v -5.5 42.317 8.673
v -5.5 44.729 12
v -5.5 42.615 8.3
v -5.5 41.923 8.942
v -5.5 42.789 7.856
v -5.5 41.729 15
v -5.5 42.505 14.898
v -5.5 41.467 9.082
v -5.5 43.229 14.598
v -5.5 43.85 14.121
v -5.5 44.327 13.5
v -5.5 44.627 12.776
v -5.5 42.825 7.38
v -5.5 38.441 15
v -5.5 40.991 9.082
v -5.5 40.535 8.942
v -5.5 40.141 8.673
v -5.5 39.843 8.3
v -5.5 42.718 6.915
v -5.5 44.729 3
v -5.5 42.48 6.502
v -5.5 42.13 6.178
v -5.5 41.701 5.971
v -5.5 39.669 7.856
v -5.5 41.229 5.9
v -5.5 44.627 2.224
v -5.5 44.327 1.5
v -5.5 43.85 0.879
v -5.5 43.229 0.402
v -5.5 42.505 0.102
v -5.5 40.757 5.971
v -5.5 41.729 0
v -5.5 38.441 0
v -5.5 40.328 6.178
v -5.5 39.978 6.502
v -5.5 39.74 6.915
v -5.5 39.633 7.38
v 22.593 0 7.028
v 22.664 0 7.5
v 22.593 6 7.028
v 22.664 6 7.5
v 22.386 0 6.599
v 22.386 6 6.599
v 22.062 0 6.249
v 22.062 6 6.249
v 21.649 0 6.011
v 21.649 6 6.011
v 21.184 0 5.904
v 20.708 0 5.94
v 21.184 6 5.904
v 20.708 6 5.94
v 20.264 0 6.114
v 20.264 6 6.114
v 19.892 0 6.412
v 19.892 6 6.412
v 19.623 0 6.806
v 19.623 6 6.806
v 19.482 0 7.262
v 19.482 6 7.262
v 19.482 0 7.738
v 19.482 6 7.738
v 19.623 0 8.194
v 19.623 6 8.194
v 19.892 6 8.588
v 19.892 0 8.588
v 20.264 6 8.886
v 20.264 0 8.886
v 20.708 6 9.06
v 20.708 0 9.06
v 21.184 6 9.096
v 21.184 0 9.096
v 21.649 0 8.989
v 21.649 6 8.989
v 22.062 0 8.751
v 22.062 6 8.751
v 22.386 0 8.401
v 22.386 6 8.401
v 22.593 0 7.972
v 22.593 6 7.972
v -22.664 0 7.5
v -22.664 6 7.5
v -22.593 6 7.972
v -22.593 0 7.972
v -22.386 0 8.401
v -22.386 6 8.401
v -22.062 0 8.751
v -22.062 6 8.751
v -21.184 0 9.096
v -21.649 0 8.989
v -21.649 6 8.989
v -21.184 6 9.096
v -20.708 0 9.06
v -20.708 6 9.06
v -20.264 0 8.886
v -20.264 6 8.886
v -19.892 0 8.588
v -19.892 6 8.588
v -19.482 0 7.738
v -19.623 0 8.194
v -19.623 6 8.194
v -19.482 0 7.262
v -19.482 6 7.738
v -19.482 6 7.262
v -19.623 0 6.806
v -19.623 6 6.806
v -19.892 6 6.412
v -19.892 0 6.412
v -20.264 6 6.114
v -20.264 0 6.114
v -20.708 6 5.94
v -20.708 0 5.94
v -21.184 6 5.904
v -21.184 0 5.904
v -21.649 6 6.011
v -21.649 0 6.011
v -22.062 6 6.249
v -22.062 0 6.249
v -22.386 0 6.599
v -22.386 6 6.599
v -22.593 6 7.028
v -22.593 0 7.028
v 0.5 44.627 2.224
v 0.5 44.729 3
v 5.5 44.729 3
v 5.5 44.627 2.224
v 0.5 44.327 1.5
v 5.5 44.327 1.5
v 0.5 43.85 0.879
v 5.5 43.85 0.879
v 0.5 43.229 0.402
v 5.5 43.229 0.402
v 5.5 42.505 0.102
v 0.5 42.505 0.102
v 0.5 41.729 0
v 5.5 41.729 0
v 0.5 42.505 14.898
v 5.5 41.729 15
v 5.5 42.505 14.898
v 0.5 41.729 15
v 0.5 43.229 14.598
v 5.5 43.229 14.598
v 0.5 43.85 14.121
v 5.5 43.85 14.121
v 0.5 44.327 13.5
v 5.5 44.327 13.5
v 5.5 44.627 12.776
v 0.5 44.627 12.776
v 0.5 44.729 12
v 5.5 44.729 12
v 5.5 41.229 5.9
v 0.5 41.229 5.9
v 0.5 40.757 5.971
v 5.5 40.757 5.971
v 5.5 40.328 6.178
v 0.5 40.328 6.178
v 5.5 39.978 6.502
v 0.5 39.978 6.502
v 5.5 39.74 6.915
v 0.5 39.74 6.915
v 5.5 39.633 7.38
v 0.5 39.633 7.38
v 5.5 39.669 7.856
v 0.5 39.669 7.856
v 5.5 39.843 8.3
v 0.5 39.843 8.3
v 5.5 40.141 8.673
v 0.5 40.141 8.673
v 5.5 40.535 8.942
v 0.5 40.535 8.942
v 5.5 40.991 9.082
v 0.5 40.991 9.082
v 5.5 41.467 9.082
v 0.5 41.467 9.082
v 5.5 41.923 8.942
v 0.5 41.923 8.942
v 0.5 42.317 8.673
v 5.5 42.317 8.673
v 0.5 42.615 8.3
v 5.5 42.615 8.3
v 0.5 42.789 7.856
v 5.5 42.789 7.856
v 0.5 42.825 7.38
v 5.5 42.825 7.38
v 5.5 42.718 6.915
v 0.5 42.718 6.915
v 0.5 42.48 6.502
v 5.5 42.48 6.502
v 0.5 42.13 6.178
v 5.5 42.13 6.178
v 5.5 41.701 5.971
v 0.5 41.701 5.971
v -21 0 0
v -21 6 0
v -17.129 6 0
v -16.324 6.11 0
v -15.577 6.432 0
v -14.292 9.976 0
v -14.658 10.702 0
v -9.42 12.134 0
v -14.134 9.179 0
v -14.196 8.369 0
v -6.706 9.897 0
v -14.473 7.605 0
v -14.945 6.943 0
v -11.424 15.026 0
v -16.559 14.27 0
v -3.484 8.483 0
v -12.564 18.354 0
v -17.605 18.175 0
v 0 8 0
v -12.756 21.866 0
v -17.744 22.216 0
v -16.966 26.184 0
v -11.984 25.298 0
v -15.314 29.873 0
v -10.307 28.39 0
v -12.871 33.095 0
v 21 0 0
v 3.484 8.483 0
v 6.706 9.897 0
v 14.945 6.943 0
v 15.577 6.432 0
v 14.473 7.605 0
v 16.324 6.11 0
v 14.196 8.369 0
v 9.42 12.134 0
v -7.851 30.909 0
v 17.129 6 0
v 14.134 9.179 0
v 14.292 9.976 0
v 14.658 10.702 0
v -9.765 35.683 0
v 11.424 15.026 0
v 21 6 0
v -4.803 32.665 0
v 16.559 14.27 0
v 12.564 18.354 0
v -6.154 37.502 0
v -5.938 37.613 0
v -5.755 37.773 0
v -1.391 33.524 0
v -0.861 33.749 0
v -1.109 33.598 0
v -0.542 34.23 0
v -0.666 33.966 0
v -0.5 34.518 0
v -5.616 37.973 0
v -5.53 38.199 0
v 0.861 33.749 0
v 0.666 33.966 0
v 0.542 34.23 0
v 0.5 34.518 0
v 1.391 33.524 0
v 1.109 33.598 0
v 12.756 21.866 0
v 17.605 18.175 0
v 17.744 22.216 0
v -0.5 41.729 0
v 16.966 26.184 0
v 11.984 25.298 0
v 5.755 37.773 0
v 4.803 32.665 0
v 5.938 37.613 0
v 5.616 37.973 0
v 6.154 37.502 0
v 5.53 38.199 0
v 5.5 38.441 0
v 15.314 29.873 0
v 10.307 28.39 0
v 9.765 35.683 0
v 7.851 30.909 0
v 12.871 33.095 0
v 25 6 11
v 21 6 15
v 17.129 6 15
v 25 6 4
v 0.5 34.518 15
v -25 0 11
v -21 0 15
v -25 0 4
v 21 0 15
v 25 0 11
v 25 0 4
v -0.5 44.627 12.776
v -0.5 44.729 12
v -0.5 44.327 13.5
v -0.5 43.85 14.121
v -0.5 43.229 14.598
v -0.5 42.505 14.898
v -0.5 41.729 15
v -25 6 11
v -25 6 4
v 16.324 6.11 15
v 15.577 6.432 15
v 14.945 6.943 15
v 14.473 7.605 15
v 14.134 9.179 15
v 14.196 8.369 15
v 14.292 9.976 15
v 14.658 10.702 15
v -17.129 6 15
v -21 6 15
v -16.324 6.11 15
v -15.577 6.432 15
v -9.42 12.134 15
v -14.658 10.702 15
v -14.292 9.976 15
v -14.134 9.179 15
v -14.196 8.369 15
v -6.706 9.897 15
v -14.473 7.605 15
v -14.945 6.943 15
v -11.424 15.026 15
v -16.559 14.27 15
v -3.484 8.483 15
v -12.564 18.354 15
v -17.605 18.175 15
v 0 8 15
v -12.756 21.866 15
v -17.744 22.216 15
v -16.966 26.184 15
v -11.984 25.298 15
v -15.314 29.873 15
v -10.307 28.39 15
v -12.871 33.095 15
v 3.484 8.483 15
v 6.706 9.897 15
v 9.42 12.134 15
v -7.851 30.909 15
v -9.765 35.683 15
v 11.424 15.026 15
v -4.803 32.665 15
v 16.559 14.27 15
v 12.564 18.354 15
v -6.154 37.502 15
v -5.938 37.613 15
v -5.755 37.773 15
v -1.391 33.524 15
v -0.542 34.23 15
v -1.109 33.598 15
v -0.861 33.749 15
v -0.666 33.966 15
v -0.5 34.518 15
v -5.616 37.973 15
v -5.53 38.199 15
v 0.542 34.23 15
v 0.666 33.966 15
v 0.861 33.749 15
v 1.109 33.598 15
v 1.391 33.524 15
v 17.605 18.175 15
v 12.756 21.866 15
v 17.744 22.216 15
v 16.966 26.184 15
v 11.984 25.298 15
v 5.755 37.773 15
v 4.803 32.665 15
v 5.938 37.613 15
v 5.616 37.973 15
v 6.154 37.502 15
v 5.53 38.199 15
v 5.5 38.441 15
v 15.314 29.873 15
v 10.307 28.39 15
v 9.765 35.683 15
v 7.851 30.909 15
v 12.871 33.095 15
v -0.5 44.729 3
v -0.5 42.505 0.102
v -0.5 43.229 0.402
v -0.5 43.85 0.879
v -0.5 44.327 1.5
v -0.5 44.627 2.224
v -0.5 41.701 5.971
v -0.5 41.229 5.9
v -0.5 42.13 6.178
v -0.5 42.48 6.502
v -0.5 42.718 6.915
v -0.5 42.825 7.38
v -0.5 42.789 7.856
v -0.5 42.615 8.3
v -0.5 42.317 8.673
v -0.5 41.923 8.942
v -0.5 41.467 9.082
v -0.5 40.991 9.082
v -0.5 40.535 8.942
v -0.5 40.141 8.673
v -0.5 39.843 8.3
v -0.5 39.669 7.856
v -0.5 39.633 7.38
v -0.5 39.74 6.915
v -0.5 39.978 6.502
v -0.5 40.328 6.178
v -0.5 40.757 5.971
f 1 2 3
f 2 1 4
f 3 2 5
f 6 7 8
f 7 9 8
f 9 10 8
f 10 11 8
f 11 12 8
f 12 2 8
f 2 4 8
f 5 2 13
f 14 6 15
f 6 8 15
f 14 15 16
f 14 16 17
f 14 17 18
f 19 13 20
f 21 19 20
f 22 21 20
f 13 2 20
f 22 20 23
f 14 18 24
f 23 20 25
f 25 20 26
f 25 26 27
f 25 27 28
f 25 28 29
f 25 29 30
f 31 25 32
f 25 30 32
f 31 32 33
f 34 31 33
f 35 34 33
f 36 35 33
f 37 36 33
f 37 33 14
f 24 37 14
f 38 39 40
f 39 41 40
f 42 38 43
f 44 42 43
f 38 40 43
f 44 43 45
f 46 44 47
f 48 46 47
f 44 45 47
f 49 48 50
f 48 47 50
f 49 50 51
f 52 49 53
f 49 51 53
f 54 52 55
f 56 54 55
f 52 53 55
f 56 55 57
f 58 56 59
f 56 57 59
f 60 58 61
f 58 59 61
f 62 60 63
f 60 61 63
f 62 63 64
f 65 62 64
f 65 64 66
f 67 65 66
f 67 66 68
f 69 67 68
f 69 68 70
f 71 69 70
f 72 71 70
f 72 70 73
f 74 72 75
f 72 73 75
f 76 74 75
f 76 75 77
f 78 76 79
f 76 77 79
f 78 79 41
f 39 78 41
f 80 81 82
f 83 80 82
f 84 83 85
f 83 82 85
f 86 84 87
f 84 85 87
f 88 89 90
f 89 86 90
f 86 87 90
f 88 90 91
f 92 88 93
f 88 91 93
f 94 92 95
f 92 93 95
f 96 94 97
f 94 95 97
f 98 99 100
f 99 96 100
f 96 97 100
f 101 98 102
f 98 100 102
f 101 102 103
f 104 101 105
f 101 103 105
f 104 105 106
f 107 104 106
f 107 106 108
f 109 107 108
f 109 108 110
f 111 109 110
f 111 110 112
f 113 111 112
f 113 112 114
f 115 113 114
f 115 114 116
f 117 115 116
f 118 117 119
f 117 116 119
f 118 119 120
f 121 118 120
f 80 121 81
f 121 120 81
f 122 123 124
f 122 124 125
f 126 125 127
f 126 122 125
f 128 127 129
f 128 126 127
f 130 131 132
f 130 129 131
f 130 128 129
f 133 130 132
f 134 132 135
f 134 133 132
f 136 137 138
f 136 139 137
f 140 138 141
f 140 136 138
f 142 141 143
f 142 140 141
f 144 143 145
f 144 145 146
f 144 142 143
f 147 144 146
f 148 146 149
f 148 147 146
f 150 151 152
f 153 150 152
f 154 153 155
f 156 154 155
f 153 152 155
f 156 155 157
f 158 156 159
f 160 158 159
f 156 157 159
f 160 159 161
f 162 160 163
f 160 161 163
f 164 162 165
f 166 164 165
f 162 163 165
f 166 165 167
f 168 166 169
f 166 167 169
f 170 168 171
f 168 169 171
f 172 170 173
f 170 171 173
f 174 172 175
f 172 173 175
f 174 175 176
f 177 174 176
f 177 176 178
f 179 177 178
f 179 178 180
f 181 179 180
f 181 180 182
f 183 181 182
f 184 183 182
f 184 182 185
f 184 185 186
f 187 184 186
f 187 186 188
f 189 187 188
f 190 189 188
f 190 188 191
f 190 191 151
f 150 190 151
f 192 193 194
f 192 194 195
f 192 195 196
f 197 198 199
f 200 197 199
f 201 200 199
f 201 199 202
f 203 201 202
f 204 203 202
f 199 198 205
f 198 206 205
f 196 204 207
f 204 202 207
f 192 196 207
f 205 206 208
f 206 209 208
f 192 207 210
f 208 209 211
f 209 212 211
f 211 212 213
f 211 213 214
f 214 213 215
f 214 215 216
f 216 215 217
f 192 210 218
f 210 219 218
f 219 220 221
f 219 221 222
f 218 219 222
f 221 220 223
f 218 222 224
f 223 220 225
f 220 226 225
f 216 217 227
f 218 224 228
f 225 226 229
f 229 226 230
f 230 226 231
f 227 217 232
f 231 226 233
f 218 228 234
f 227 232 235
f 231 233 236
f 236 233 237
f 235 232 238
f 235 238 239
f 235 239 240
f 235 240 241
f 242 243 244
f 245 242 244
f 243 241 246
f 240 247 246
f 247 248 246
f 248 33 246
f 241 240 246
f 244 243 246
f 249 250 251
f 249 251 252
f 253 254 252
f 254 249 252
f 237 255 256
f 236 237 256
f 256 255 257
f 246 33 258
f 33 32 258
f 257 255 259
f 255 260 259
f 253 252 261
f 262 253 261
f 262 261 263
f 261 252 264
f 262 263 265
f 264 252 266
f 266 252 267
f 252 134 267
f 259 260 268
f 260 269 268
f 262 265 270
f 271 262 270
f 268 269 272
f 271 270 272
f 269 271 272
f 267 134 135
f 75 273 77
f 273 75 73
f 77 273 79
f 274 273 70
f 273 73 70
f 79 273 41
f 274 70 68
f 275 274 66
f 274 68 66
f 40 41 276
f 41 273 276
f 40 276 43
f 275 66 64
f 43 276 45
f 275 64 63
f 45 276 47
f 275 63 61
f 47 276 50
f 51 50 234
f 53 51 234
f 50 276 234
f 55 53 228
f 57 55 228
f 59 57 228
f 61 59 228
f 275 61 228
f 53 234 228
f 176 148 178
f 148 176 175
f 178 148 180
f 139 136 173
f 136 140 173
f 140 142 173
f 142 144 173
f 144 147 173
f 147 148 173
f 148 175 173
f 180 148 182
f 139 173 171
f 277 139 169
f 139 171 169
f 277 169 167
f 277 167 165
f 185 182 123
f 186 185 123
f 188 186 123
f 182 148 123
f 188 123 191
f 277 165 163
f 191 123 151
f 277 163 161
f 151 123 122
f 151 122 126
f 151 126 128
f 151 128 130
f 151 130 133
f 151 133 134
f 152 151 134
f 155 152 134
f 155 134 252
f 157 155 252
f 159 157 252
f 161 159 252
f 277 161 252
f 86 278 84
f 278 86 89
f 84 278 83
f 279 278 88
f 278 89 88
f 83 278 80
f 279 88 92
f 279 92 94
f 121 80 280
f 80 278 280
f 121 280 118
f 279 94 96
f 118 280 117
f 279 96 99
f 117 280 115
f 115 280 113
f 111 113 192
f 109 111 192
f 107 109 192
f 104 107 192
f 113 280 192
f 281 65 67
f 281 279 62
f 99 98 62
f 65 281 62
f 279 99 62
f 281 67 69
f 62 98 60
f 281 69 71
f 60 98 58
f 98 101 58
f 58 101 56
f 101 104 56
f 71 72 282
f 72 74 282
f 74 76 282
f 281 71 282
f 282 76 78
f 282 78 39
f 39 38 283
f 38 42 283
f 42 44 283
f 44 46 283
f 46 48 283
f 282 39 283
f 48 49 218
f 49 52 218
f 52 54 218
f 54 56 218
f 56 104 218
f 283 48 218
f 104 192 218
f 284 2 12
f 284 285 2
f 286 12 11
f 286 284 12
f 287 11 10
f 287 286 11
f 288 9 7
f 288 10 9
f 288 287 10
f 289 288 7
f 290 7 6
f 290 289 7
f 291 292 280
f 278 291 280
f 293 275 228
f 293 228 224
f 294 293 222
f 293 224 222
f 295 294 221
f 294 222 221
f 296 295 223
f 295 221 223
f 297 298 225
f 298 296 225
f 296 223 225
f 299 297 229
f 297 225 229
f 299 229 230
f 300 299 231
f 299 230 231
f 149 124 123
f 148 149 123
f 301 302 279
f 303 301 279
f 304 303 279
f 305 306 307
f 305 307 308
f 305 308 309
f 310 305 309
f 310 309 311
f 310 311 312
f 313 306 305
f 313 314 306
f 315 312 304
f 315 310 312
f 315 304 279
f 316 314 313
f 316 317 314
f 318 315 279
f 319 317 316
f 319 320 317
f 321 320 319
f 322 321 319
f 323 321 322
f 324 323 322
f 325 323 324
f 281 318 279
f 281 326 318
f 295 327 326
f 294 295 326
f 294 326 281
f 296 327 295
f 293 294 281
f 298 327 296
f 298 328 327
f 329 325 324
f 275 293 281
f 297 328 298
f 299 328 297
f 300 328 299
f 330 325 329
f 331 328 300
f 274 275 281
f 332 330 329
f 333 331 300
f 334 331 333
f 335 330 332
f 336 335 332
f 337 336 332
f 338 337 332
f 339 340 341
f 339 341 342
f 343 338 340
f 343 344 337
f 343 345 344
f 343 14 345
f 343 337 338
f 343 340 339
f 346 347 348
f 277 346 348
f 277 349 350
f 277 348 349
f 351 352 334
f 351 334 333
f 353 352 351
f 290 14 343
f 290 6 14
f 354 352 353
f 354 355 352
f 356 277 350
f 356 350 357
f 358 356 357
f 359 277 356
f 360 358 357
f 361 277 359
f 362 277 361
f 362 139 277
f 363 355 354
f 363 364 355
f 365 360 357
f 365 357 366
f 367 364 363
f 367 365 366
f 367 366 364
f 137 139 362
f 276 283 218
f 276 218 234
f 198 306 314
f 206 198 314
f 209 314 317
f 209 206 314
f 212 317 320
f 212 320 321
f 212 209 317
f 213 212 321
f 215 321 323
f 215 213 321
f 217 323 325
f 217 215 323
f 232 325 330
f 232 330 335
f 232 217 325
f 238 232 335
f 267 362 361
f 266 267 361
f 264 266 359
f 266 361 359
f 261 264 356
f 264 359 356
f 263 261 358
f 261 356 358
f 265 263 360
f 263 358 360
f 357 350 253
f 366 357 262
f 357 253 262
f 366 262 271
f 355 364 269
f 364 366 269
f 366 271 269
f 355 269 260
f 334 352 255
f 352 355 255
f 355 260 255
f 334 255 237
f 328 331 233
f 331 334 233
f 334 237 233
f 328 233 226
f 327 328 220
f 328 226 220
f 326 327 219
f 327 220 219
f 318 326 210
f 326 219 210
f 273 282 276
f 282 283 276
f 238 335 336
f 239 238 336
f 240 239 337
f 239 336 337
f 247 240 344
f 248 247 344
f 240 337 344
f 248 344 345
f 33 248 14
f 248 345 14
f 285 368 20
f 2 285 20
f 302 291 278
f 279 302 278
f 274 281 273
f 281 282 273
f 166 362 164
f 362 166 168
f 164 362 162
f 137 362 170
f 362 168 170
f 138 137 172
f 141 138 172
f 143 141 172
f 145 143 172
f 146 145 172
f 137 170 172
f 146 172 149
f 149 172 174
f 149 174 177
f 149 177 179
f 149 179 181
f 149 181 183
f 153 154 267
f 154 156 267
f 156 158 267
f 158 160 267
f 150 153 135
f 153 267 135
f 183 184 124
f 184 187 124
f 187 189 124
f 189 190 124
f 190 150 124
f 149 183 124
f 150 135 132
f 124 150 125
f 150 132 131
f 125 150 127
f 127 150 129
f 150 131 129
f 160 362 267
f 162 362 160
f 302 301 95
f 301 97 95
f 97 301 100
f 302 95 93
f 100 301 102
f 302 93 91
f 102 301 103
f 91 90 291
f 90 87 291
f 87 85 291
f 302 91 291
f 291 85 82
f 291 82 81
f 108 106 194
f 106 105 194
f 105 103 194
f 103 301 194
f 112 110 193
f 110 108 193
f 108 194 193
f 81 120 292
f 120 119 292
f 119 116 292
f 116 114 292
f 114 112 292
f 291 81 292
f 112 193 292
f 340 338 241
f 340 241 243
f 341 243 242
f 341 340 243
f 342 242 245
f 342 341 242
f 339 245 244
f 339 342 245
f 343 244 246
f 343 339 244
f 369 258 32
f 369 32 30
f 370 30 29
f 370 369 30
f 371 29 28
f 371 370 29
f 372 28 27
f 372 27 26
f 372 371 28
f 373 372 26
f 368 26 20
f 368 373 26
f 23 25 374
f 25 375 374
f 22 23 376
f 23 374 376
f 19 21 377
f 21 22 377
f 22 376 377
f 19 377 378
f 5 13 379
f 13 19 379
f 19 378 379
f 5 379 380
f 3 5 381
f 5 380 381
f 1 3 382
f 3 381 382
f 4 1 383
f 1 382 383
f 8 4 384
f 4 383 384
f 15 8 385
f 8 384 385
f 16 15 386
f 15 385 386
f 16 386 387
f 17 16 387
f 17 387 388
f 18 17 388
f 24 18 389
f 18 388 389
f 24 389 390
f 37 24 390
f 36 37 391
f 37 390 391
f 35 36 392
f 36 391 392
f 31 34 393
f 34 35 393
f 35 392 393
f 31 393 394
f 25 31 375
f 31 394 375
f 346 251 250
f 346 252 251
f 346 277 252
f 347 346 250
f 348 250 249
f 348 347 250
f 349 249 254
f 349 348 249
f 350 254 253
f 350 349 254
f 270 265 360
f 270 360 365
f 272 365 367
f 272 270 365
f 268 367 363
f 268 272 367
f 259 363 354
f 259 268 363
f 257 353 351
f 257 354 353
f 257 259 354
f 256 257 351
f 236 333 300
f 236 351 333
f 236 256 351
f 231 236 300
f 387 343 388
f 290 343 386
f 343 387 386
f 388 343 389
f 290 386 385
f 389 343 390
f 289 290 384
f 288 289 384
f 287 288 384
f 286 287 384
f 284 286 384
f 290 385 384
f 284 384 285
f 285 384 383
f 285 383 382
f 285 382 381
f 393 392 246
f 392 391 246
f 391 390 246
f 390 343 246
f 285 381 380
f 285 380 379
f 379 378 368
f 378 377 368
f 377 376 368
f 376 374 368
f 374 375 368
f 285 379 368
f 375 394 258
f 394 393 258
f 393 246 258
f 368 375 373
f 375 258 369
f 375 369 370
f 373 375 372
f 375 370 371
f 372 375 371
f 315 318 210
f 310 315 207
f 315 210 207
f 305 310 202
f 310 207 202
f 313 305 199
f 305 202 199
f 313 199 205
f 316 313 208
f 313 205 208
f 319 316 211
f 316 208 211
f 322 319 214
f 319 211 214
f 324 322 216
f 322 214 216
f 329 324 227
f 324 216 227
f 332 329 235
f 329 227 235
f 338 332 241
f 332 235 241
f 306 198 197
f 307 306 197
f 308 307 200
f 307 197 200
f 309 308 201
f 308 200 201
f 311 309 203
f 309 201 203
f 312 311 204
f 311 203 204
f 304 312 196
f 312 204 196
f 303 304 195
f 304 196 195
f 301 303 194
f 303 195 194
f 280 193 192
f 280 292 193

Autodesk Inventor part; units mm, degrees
ref_plane "YZ Plane" through (0, 0, 0) normal (1, 0, 0) x (0, 1, 0)
ref_plane "XZ Plane" through (0, 0, 0) normal (0, 1, 0) x (-1, 0, 0)
ref_plane "XY Plane" through (0, 0, 0) normal (0, 0, 1) x (1, 0, 0)
sketch "Sketch1" plane through (0, 0, 0) normal (0, 0, 1) x (1, 0, 0)
  line L0 (0, 0) -> (25, 0)
  line L1 (25, 0) -> (25, 6)
  line L2 (25, 6) -> (17.1289, 6)
  arc A0 (14.6584, 10.7019) -> (5.5, 37.729) centre (0, 20.8) ccw
  line L3 (0, 0) -> (0, 8)
  arc A1 (0, 8) -> (0.5, 33.5902) centre (0, 20.8) ccw
  arc A2 (14.6584, 10.7019) -> (17.1289, 6) centre (17.1289, 9) ccw
  line L4 (5.5, 37.729) -> (5.5, 44.729)
  line L5 (5.5, 44.729) -> (0.5, 44.729)
  line L6 (0.5, 44.729) -> (0.5, 33.5902)
  point P0 (9.8894, 6)
  dimension "d0" = 12.8
  dimension "d2" = 5
  dimension "d3" = 25
  dimension "d4" = 6
  dimension "d5" = 8
  dimension "d6" = 3
  dimension "d7" = 1
  dimension "d8" = 5
  dimension "d9" = 7
extrude "Extrusion1" add sketch "Sketch1" along normal blind 15
sketch "Sketch2" plane through (17.1289, 6, 0) normal (0, 1, 0) x (1, 0, 0)
  line L0 (7.8711, 0) -> (7.8711, -15) projected
  line L1 (7.8711, -15) -> (0, 0) construction
  line L2 (7.8711, 0) -> (0, 0) projected
  circle A0 centre (3.9355, -7.5) radius 1.6
  point P0 (-17.1289, 0)
  dimension "d15" = 3.2
extrude "Extrusion2" cut sketch "Sketch2" against normal through all
chamfer "Chamfer1" distance 4 angle 45 2 edges at (25, 3, 15) (25, 3, 0)
sketch "Sketch3" plane through (5.5, 37.729, 0) normal (1, 0, 0) x (0, 0, -1)
  line L0 (-15, 0) -> (0, 7) construction
  point P0 (0, -37.729)
  point P1 (-7.5, 3.5)
hole "Hole1" at (5.5, 41.229, 7.5) direction (-1, 0, 0) diameter 3.2 end through all
fillet "Fillet1" radius 3 2 edges at (3, 44.729, 0) (3, 44.729, 15)
fillet "Fillet1" radius 1 2 edges at (5.5, 37.729, 7.5) (0.5, 33.5902, 7.5)
mirror "Mirror1" about plane through (0, 8, 0) normal (-1, 0, 0)
properties part number "atomizer_holder"
